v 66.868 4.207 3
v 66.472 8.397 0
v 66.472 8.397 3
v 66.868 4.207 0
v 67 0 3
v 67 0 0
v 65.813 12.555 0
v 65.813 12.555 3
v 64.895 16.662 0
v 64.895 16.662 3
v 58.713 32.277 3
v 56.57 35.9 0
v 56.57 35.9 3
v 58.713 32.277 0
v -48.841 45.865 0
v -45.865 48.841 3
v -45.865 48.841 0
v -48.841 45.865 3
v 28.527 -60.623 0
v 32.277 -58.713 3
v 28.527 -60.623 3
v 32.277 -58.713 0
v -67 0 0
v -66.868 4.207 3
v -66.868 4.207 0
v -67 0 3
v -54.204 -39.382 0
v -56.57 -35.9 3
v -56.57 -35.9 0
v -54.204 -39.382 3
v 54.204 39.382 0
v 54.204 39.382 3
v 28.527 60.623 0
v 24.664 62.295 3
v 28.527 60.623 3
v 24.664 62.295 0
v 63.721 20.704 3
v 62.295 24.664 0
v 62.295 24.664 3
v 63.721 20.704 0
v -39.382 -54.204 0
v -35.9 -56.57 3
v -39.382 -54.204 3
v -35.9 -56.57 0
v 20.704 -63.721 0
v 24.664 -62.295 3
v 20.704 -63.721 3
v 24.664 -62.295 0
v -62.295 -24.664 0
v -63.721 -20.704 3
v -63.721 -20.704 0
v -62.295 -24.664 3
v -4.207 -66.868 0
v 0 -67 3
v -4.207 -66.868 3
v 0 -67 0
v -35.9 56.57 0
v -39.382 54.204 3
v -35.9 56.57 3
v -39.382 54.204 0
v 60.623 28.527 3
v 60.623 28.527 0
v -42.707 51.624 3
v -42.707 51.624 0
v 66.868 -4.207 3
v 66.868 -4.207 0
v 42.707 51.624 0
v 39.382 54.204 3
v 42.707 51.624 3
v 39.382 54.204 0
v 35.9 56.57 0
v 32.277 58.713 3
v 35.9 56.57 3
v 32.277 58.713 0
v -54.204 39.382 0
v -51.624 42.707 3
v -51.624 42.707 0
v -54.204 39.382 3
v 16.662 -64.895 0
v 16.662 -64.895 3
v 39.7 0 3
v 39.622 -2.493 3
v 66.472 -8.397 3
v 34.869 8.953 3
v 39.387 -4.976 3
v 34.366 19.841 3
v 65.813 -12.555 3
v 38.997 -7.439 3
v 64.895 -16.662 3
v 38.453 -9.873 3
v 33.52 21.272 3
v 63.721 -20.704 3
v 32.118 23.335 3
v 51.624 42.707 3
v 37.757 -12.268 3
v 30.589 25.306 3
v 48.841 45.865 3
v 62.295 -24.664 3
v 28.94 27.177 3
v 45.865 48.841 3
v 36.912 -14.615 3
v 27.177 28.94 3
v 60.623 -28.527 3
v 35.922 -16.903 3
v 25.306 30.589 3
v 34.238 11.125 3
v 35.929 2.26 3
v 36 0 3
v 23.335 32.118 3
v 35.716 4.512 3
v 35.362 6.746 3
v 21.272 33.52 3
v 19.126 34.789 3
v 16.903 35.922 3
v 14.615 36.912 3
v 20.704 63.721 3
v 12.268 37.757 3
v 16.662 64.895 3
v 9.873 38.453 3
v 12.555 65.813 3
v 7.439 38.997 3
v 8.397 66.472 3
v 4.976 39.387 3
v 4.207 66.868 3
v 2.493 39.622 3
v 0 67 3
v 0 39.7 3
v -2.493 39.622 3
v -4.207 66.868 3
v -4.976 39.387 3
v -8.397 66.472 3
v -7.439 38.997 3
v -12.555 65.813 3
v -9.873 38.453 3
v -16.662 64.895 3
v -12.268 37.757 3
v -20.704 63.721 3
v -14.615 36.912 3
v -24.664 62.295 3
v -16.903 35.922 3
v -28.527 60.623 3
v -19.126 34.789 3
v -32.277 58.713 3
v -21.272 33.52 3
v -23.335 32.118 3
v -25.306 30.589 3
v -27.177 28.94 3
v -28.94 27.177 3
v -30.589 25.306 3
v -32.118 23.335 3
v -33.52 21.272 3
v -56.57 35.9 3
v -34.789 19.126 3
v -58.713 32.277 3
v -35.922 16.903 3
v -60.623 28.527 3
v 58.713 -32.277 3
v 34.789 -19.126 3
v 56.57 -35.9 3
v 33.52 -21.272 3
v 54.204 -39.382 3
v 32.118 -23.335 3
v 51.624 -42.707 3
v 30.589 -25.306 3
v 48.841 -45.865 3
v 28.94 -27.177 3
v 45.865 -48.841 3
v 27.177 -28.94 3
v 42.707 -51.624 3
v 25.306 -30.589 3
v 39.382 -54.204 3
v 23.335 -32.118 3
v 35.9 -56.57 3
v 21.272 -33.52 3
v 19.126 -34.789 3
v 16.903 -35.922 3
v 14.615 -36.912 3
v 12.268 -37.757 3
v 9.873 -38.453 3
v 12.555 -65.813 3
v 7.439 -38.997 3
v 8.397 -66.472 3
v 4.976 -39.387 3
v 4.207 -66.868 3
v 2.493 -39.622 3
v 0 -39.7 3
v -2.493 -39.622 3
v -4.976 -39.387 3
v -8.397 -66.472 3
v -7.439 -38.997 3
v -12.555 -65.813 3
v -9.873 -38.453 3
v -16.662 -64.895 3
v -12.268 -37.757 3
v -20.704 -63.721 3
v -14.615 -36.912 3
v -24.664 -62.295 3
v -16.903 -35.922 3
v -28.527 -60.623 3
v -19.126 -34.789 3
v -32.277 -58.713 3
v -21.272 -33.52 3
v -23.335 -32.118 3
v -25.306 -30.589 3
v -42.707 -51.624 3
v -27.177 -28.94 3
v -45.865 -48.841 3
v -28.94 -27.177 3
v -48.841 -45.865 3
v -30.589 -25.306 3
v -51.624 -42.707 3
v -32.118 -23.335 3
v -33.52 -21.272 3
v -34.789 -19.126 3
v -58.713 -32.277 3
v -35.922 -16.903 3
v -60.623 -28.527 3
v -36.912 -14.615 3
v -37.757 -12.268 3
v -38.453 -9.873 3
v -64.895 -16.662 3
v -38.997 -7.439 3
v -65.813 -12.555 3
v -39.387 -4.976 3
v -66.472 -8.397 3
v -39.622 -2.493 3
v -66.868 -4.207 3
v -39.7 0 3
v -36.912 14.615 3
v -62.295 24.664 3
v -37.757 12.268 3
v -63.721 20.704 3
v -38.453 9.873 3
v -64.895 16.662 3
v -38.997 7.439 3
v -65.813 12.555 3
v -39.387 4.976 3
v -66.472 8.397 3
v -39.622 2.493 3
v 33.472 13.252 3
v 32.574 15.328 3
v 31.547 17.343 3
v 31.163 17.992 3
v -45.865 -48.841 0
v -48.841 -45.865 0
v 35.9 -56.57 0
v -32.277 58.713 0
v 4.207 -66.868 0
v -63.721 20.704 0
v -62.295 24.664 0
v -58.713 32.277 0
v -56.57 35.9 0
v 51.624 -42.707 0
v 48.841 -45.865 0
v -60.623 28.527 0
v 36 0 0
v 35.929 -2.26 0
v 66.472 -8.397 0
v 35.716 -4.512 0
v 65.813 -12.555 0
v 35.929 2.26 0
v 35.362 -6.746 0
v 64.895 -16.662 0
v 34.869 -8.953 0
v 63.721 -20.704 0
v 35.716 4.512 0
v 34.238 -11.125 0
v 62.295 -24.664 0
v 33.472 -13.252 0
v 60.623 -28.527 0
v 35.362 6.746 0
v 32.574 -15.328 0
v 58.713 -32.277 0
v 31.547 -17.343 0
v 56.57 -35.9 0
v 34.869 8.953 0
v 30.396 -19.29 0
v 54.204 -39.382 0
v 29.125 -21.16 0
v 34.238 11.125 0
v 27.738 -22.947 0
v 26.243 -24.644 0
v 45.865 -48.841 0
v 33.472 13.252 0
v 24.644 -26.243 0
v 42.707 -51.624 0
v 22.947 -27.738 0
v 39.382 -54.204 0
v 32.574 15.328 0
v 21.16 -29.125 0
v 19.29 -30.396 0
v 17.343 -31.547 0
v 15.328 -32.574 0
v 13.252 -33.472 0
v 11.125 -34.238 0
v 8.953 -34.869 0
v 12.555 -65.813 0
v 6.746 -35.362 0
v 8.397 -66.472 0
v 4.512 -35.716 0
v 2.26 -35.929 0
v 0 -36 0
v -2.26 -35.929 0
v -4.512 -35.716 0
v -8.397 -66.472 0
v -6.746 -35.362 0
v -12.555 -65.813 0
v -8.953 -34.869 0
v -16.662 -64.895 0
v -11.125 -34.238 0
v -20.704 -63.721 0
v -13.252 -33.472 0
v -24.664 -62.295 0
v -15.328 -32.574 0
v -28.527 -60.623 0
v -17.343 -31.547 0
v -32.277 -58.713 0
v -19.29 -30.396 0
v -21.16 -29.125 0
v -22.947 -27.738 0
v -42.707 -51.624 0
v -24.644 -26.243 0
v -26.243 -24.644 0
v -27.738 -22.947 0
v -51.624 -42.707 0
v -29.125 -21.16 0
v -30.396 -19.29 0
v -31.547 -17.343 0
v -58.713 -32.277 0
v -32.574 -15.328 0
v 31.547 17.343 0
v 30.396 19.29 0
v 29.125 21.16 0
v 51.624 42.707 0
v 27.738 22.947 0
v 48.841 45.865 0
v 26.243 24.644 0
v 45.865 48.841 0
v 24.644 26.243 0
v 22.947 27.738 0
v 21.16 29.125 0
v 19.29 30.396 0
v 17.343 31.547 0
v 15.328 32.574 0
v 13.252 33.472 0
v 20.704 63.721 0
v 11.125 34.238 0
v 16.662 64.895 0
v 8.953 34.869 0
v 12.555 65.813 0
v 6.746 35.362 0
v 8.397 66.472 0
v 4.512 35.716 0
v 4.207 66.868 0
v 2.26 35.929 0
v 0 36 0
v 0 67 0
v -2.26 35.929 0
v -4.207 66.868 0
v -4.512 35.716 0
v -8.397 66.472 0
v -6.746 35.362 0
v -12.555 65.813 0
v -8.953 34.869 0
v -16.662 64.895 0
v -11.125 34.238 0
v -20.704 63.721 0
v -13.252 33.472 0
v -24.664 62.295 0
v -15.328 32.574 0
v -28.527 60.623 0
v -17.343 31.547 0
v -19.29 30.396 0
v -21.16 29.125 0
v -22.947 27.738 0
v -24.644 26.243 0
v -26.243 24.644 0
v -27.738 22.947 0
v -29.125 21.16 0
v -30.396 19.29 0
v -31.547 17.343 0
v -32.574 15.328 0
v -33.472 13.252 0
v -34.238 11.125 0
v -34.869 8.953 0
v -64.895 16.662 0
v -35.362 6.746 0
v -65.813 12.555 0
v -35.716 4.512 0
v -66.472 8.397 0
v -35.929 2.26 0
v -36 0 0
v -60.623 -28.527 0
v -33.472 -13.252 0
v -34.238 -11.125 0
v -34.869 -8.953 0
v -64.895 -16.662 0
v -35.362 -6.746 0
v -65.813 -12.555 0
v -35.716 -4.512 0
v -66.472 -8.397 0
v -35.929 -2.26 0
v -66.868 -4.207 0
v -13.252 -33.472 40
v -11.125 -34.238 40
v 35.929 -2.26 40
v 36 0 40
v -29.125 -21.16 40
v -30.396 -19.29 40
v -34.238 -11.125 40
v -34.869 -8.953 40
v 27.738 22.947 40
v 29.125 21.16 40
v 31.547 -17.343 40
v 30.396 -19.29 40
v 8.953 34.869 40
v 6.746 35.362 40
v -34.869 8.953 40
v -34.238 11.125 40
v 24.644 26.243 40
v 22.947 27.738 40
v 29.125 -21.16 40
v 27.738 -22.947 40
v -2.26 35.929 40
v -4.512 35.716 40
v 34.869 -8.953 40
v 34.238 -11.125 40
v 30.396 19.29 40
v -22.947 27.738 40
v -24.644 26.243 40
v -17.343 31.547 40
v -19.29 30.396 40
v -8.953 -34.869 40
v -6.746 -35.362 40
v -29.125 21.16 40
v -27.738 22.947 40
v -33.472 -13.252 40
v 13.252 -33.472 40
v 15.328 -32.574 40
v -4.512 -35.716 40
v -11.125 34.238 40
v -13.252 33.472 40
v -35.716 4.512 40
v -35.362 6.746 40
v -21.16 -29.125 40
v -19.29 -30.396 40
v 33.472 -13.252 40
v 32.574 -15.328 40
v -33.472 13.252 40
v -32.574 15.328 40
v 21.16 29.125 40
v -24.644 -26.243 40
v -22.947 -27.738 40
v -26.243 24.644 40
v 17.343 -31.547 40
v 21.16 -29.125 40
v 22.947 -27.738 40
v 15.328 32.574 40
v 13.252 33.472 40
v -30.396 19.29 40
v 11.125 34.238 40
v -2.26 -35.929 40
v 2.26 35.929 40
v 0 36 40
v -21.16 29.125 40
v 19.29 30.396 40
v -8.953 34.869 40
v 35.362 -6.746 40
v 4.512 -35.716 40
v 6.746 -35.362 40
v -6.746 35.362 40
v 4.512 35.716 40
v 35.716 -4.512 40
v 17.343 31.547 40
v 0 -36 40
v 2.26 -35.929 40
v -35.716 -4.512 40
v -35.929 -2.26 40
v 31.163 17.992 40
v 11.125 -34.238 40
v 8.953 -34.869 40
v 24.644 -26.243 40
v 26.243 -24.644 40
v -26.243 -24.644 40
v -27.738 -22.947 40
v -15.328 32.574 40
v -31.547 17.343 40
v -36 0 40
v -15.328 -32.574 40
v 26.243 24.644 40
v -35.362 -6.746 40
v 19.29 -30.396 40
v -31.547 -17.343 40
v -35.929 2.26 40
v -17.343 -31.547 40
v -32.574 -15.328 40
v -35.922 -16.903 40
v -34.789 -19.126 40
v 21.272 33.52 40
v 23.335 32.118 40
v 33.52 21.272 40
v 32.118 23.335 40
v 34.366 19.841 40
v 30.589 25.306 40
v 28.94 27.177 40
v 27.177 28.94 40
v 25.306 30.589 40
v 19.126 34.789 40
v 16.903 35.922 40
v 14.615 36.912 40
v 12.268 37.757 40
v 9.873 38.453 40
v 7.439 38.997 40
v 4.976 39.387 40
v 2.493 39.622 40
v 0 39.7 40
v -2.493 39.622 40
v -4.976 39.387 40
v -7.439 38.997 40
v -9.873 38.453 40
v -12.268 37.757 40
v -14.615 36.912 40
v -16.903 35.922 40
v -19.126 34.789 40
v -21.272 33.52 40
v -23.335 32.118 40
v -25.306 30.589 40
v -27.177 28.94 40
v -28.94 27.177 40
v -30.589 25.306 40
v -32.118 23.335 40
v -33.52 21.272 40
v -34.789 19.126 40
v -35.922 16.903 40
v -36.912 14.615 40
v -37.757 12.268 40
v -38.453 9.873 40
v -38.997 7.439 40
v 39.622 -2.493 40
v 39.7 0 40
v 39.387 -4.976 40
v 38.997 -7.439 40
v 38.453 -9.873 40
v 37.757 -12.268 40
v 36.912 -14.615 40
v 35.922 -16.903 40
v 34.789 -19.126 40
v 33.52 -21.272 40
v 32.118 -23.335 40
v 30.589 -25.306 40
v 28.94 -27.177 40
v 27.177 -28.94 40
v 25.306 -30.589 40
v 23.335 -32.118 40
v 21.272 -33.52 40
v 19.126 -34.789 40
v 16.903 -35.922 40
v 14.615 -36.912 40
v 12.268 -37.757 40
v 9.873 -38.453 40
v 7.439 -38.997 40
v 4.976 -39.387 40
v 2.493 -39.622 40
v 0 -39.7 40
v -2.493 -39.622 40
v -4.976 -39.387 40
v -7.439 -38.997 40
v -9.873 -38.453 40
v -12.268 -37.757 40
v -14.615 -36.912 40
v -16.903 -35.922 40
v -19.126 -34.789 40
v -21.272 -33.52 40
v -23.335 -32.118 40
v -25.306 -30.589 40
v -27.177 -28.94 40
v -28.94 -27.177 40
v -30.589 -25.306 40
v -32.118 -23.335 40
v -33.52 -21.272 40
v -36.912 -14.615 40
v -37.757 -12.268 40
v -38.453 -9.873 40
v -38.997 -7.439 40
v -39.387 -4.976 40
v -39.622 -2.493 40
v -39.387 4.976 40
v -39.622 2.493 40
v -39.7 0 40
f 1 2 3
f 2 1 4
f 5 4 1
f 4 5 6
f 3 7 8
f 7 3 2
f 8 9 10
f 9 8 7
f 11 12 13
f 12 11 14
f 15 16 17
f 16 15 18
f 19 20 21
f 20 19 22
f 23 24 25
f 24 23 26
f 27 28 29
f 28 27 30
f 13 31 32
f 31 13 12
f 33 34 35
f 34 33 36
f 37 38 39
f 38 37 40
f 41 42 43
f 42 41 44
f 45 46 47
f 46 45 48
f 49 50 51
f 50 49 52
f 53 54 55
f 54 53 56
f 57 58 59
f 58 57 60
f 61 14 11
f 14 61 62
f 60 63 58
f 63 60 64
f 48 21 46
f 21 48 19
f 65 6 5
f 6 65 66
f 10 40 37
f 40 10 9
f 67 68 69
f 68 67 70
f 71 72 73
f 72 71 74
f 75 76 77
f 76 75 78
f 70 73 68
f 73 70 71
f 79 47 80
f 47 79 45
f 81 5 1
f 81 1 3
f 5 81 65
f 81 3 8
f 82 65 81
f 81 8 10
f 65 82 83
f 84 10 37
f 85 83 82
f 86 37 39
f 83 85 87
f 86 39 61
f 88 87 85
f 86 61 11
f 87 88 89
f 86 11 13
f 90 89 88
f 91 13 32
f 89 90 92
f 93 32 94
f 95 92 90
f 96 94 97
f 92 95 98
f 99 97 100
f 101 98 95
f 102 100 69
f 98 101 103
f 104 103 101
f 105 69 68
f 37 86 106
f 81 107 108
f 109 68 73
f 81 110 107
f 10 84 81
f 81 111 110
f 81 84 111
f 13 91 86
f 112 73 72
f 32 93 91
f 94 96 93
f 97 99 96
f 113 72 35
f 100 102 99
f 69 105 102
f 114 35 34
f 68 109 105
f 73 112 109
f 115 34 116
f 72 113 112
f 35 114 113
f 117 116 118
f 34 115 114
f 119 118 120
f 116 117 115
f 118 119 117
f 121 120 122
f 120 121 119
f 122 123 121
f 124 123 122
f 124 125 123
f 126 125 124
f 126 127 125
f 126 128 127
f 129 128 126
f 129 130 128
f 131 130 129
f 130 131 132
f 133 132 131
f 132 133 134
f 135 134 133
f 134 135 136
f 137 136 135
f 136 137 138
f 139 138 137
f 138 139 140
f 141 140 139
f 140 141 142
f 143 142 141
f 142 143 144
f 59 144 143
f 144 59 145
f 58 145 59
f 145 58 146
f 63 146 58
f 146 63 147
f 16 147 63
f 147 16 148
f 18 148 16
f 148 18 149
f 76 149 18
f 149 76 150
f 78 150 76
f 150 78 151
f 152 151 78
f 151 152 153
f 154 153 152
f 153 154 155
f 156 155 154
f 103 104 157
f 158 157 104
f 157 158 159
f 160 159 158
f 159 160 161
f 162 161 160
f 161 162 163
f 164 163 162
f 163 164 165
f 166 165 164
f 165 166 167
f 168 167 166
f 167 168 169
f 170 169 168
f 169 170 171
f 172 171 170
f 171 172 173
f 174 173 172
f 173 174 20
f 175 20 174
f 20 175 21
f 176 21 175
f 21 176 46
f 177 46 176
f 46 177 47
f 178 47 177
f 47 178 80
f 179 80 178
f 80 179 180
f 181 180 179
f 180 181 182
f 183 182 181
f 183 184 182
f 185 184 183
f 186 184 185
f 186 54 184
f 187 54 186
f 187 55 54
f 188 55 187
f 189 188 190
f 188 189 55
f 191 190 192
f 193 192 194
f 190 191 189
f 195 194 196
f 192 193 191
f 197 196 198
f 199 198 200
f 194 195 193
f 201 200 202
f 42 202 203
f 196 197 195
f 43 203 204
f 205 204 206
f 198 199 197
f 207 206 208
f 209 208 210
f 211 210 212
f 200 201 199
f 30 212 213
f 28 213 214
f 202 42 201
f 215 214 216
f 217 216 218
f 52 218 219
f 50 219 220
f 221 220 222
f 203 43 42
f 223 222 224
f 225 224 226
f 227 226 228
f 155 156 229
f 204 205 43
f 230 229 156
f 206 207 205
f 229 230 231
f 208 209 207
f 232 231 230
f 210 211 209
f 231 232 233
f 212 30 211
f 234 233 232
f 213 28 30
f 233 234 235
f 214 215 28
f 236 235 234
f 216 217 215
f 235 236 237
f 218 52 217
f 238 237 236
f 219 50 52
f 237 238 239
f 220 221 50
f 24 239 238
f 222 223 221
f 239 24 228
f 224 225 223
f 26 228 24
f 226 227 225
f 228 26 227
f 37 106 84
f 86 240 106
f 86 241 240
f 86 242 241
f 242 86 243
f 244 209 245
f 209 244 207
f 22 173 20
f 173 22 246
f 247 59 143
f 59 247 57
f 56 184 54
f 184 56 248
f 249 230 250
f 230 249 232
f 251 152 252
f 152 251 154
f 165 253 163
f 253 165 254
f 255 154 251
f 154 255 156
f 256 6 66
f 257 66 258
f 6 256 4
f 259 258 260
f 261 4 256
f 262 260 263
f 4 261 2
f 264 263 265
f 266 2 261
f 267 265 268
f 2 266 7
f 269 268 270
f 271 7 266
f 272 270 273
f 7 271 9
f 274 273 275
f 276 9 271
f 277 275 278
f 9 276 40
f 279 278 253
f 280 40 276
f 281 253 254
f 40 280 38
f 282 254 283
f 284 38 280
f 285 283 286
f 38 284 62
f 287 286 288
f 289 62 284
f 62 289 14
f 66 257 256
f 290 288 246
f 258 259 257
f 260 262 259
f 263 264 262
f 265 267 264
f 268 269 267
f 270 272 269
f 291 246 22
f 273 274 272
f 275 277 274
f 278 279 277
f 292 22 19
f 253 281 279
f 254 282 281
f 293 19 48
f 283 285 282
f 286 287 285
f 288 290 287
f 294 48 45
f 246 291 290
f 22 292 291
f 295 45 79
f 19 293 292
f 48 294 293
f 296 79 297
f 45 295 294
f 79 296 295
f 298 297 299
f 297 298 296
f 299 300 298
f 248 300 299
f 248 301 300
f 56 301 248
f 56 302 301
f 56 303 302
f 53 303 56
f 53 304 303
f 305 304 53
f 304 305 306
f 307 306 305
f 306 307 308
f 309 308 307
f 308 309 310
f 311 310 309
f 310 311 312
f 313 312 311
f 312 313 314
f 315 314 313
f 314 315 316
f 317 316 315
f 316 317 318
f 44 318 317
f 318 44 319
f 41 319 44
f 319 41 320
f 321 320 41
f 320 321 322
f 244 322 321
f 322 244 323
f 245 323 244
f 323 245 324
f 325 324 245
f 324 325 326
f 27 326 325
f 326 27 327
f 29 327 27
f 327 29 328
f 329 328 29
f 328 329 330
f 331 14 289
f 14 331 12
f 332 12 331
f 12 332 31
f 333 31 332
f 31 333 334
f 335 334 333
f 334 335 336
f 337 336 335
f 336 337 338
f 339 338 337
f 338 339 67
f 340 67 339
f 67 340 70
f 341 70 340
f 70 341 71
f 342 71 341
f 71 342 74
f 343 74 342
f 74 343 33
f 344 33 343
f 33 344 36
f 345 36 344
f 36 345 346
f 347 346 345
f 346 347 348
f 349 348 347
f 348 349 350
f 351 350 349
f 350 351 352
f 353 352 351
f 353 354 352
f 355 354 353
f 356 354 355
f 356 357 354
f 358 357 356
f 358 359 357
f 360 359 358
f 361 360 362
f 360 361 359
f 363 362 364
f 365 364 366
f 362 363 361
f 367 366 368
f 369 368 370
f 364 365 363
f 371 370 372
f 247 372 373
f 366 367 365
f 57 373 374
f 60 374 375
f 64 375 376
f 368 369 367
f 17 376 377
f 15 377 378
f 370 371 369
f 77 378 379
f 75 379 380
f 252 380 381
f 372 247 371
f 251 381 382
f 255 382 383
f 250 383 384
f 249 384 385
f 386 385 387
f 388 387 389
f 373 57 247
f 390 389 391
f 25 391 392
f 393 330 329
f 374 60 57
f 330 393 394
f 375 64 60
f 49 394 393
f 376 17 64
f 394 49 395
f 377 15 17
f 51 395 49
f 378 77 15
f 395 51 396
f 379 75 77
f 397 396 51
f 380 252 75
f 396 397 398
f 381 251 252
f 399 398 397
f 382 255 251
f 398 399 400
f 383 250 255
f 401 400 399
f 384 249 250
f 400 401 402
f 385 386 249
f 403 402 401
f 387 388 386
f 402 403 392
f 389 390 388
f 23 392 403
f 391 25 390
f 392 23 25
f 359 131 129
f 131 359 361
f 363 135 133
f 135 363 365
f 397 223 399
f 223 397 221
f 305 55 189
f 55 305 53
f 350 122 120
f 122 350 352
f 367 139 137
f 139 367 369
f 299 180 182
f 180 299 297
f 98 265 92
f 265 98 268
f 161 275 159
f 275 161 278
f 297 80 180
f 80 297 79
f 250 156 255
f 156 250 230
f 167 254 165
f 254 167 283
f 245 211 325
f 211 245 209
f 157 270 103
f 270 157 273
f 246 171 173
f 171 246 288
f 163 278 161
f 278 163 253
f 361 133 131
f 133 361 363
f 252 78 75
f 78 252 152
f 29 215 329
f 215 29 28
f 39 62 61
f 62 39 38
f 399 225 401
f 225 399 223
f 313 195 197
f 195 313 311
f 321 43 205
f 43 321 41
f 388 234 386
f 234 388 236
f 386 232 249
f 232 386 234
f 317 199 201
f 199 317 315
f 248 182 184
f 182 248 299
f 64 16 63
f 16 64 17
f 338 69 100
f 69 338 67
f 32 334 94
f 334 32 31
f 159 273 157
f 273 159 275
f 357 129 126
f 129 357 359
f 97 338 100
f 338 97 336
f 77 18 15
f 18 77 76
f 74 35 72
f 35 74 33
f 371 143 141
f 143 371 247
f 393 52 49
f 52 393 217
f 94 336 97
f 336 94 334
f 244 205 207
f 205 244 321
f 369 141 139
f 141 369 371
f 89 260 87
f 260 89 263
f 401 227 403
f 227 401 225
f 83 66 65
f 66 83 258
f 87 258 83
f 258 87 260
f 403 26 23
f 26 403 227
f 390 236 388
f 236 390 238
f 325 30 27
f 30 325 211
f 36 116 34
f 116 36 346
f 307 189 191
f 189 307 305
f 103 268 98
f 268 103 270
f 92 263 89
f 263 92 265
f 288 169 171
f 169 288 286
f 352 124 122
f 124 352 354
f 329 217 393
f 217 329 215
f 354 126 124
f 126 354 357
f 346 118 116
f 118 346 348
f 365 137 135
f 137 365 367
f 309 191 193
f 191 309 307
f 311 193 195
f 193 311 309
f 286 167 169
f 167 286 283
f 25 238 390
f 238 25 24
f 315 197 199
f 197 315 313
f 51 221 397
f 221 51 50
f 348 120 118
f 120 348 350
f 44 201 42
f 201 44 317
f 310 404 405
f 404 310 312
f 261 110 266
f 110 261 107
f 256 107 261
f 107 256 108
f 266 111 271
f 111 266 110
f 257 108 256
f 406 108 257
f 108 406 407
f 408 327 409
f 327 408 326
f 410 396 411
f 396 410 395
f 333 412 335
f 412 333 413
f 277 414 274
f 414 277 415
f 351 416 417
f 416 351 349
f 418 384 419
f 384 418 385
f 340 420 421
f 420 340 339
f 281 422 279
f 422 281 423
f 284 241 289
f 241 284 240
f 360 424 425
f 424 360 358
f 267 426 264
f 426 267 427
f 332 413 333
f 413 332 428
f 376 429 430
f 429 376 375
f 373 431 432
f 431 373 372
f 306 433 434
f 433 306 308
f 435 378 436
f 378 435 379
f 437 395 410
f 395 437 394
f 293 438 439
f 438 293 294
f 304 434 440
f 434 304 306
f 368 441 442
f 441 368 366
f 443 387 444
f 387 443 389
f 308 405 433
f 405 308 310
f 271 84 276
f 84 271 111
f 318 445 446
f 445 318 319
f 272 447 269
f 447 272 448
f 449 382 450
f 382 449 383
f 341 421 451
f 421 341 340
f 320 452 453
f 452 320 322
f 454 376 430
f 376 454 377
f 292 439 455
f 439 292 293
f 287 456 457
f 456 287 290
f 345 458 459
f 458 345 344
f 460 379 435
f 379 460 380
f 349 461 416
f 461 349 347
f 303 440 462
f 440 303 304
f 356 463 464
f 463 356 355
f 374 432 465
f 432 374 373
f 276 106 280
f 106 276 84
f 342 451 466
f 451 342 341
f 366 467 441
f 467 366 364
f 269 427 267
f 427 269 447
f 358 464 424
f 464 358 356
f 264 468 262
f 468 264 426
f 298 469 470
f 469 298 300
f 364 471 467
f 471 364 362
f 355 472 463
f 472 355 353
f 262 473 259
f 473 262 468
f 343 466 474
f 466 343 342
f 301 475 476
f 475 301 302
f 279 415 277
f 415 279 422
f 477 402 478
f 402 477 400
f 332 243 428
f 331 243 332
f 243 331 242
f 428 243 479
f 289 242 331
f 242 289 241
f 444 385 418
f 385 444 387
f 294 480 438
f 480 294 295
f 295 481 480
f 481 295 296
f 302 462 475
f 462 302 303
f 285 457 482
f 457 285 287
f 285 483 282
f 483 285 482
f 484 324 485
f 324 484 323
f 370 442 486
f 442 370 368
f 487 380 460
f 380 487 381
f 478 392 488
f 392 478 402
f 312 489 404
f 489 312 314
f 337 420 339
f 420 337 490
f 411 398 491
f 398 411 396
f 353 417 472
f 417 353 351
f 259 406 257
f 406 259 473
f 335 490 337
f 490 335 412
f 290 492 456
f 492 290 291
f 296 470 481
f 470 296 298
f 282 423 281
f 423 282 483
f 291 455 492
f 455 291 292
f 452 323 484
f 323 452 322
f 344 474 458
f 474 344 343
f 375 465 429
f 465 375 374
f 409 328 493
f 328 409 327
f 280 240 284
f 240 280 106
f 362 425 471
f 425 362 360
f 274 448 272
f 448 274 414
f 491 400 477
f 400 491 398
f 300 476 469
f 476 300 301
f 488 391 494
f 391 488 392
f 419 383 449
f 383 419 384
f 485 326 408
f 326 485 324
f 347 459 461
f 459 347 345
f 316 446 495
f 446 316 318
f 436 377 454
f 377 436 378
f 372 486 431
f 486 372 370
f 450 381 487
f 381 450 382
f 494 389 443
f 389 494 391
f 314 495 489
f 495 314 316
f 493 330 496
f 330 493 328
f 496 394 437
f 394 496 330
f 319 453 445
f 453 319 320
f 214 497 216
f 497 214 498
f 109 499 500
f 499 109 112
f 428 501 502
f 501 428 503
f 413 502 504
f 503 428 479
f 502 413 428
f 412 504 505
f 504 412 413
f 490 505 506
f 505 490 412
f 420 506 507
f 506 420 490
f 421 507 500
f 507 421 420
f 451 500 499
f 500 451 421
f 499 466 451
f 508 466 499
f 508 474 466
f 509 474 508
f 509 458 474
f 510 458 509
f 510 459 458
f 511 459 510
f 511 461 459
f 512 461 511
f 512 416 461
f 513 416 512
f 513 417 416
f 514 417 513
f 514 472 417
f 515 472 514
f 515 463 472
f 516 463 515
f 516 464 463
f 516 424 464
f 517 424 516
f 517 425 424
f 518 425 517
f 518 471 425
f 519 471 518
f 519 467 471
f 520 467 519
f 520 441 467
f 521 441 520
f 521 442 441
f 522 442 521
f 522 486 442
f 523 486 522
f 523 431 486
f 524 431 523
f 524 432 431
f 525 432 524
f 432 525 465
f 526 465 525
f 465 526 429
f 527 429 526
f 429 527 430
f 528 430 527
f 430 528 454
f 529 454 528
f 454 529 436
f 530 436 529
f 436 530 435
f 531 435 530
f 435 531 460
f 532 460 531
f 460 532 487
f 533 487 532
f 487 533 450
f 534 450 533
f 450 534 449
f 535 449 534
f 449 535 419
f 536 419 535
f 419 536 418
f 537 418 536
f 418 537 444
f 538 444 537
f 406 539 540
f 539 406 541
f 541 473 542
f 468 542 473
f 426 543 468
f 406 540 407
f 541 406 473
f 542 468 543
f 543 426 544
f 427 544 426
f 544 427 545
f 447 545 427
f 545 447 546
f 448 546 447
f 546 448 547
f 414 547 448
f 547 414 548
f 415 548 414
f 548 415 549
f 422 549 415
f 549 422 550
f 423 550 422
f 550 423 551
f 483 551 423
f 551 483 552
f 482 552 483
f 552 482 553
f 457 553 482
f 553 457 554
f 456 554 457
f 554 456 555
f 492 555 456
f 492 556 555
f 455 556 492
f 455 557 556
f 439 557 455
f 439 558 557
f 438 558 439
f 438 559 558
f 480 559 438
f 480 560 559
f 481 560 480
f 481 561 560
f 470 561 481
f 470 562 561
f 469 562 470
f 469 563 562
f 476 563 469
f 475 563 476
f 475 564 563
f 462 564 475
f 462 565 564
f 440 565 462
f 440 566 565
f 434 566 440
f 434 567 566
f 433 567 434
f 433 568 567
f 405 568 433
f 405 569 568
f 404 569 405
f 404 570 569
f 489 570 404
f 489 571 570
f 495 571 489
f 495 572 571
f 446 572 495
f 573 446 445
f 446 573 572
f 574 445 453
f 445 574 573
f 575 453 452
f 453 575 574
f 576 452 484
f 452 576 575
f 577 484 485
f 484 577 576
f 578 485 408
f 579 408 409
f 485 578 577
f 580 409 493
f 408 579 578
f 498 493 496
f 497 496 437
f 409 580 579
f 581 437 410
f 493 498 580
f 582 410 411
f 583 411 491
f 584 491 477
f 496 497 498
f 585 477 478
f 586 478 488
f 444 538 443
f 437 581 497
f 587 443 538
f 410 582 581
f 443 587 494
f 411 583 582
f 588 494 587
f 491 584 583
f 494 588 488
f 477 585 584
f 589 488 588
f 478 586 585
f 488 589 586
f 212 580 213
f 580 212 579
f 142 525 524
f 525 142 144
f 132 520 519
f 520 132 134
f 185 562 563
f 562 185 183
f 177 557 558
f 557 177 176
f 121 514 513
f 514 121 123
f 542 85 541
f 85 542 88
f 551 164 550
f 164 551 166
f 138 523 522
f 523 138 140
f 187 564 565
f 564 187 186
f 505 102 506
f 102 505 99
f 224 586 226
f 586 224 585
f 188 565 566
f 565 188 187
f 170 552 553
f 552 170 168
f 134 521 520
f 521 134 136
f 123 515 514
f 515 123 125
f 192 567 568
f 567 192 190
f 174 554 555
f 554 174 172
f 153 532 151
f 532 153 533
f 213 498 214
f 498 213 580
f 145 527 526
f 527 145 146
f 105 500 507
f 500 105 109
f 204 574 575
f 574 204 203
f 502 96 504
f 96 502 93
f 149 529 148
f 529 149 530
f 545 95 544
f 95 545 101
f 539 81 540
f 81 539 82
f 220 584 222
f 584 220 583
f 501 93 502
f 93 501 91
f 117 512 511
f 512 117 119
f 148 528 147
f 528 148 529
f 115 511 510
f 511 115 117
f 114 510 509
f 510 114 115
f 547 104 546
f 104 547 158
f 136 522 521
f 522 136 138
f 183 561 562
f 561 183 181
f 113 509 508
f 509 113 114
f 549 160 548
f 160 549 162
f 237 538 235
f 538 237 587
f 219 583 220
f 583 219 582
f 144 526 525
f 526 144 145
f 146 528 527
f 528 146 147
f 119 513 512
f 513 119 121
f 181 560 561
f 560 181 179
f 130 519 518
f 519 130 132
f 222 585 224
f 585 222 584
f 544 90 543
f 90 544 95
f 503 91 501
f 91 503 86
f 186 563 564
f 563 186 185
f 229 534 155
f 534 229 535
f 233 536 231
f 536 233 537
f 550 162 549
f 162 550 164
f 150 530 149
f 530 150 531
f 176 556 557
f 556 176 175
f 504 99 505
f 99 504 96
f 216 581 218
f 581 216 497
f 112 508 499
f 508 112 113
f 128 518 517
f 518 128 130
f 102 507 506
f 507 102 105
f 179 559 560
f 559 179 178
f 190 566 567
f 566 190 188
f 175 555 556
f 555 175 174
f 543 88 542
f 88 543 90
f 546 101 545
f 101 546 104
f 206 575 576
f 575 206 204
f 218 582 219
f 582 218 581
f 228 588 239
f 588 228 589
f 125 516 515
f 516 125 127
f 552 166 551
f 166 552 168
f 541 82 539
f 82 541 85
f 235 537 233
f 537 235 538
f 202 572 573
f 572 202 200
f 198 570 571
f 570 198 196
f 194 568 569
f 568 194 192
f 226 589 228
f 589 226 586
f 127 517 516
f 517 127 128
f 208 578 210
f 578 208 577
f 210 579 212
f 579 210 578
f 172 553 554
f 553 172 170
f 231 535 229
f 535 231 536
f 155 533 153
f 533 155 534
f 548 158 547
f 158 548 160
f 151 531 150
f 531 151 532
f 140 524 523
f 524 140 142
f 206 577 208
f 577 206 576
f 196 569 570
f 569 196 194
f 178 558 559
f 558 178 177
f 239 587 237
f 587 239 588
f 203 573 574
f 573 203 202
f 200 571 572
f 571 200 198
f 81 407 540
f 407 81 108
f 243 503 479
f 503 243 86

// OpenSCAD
// Parameter
r_in_unten = 65;
r_in_oben = 36;
h_kegel = 3;
h_zyl = 40;
wand = 2;
winkel = 15;
anzahl = 4;

r_innen = 36;
r_aussen = 39.7;
h_zylinder = 40;
fehlender_winkel = 30; // Das Stück, das weggeschnitten wird

$fn = 100;

// 1. Kegelstumpf (Hohl, Innenmaße bleiben frei)
difference() {
    cylinder(h = h_kegel, r = r_in_unten + wand);
    translate([0, 0, -1])
       cylinder(h = h_kegel + 2, r = r_in_oben);
}

difference() {
    // 1. Der hohle Hauptzylinder
    difference() {
        cylinder(h = h_zylinder, r = r_aussen);
        translate([0, 0, -1]) 
            cylinder(h = h_zylinder + 2, r = r_innen);
    }

    // 2. Das 30°-Tortenstück zum Wegschneiden
    translate([0, 0, -1]) {
        linear_extrude(height = h_zylinder + 2) {
            tortenstueck_2d(r = r_aussen + 5, winkel = fehlender_winkel);
        }
    }
}

module tortenstueck_2d(r, winkel) {
    intersection() {
        circle(r = r);
        polygon(points = concat(
            [[0, 0]],
            [for (a = [0 : 5 : winkel]) [r * 2 * cos(a), r * 2 * sin(a)]], 
            [[r * 2 * cos(winkel), r * 2 * sin(winkel)]]
        ));
    }
}
